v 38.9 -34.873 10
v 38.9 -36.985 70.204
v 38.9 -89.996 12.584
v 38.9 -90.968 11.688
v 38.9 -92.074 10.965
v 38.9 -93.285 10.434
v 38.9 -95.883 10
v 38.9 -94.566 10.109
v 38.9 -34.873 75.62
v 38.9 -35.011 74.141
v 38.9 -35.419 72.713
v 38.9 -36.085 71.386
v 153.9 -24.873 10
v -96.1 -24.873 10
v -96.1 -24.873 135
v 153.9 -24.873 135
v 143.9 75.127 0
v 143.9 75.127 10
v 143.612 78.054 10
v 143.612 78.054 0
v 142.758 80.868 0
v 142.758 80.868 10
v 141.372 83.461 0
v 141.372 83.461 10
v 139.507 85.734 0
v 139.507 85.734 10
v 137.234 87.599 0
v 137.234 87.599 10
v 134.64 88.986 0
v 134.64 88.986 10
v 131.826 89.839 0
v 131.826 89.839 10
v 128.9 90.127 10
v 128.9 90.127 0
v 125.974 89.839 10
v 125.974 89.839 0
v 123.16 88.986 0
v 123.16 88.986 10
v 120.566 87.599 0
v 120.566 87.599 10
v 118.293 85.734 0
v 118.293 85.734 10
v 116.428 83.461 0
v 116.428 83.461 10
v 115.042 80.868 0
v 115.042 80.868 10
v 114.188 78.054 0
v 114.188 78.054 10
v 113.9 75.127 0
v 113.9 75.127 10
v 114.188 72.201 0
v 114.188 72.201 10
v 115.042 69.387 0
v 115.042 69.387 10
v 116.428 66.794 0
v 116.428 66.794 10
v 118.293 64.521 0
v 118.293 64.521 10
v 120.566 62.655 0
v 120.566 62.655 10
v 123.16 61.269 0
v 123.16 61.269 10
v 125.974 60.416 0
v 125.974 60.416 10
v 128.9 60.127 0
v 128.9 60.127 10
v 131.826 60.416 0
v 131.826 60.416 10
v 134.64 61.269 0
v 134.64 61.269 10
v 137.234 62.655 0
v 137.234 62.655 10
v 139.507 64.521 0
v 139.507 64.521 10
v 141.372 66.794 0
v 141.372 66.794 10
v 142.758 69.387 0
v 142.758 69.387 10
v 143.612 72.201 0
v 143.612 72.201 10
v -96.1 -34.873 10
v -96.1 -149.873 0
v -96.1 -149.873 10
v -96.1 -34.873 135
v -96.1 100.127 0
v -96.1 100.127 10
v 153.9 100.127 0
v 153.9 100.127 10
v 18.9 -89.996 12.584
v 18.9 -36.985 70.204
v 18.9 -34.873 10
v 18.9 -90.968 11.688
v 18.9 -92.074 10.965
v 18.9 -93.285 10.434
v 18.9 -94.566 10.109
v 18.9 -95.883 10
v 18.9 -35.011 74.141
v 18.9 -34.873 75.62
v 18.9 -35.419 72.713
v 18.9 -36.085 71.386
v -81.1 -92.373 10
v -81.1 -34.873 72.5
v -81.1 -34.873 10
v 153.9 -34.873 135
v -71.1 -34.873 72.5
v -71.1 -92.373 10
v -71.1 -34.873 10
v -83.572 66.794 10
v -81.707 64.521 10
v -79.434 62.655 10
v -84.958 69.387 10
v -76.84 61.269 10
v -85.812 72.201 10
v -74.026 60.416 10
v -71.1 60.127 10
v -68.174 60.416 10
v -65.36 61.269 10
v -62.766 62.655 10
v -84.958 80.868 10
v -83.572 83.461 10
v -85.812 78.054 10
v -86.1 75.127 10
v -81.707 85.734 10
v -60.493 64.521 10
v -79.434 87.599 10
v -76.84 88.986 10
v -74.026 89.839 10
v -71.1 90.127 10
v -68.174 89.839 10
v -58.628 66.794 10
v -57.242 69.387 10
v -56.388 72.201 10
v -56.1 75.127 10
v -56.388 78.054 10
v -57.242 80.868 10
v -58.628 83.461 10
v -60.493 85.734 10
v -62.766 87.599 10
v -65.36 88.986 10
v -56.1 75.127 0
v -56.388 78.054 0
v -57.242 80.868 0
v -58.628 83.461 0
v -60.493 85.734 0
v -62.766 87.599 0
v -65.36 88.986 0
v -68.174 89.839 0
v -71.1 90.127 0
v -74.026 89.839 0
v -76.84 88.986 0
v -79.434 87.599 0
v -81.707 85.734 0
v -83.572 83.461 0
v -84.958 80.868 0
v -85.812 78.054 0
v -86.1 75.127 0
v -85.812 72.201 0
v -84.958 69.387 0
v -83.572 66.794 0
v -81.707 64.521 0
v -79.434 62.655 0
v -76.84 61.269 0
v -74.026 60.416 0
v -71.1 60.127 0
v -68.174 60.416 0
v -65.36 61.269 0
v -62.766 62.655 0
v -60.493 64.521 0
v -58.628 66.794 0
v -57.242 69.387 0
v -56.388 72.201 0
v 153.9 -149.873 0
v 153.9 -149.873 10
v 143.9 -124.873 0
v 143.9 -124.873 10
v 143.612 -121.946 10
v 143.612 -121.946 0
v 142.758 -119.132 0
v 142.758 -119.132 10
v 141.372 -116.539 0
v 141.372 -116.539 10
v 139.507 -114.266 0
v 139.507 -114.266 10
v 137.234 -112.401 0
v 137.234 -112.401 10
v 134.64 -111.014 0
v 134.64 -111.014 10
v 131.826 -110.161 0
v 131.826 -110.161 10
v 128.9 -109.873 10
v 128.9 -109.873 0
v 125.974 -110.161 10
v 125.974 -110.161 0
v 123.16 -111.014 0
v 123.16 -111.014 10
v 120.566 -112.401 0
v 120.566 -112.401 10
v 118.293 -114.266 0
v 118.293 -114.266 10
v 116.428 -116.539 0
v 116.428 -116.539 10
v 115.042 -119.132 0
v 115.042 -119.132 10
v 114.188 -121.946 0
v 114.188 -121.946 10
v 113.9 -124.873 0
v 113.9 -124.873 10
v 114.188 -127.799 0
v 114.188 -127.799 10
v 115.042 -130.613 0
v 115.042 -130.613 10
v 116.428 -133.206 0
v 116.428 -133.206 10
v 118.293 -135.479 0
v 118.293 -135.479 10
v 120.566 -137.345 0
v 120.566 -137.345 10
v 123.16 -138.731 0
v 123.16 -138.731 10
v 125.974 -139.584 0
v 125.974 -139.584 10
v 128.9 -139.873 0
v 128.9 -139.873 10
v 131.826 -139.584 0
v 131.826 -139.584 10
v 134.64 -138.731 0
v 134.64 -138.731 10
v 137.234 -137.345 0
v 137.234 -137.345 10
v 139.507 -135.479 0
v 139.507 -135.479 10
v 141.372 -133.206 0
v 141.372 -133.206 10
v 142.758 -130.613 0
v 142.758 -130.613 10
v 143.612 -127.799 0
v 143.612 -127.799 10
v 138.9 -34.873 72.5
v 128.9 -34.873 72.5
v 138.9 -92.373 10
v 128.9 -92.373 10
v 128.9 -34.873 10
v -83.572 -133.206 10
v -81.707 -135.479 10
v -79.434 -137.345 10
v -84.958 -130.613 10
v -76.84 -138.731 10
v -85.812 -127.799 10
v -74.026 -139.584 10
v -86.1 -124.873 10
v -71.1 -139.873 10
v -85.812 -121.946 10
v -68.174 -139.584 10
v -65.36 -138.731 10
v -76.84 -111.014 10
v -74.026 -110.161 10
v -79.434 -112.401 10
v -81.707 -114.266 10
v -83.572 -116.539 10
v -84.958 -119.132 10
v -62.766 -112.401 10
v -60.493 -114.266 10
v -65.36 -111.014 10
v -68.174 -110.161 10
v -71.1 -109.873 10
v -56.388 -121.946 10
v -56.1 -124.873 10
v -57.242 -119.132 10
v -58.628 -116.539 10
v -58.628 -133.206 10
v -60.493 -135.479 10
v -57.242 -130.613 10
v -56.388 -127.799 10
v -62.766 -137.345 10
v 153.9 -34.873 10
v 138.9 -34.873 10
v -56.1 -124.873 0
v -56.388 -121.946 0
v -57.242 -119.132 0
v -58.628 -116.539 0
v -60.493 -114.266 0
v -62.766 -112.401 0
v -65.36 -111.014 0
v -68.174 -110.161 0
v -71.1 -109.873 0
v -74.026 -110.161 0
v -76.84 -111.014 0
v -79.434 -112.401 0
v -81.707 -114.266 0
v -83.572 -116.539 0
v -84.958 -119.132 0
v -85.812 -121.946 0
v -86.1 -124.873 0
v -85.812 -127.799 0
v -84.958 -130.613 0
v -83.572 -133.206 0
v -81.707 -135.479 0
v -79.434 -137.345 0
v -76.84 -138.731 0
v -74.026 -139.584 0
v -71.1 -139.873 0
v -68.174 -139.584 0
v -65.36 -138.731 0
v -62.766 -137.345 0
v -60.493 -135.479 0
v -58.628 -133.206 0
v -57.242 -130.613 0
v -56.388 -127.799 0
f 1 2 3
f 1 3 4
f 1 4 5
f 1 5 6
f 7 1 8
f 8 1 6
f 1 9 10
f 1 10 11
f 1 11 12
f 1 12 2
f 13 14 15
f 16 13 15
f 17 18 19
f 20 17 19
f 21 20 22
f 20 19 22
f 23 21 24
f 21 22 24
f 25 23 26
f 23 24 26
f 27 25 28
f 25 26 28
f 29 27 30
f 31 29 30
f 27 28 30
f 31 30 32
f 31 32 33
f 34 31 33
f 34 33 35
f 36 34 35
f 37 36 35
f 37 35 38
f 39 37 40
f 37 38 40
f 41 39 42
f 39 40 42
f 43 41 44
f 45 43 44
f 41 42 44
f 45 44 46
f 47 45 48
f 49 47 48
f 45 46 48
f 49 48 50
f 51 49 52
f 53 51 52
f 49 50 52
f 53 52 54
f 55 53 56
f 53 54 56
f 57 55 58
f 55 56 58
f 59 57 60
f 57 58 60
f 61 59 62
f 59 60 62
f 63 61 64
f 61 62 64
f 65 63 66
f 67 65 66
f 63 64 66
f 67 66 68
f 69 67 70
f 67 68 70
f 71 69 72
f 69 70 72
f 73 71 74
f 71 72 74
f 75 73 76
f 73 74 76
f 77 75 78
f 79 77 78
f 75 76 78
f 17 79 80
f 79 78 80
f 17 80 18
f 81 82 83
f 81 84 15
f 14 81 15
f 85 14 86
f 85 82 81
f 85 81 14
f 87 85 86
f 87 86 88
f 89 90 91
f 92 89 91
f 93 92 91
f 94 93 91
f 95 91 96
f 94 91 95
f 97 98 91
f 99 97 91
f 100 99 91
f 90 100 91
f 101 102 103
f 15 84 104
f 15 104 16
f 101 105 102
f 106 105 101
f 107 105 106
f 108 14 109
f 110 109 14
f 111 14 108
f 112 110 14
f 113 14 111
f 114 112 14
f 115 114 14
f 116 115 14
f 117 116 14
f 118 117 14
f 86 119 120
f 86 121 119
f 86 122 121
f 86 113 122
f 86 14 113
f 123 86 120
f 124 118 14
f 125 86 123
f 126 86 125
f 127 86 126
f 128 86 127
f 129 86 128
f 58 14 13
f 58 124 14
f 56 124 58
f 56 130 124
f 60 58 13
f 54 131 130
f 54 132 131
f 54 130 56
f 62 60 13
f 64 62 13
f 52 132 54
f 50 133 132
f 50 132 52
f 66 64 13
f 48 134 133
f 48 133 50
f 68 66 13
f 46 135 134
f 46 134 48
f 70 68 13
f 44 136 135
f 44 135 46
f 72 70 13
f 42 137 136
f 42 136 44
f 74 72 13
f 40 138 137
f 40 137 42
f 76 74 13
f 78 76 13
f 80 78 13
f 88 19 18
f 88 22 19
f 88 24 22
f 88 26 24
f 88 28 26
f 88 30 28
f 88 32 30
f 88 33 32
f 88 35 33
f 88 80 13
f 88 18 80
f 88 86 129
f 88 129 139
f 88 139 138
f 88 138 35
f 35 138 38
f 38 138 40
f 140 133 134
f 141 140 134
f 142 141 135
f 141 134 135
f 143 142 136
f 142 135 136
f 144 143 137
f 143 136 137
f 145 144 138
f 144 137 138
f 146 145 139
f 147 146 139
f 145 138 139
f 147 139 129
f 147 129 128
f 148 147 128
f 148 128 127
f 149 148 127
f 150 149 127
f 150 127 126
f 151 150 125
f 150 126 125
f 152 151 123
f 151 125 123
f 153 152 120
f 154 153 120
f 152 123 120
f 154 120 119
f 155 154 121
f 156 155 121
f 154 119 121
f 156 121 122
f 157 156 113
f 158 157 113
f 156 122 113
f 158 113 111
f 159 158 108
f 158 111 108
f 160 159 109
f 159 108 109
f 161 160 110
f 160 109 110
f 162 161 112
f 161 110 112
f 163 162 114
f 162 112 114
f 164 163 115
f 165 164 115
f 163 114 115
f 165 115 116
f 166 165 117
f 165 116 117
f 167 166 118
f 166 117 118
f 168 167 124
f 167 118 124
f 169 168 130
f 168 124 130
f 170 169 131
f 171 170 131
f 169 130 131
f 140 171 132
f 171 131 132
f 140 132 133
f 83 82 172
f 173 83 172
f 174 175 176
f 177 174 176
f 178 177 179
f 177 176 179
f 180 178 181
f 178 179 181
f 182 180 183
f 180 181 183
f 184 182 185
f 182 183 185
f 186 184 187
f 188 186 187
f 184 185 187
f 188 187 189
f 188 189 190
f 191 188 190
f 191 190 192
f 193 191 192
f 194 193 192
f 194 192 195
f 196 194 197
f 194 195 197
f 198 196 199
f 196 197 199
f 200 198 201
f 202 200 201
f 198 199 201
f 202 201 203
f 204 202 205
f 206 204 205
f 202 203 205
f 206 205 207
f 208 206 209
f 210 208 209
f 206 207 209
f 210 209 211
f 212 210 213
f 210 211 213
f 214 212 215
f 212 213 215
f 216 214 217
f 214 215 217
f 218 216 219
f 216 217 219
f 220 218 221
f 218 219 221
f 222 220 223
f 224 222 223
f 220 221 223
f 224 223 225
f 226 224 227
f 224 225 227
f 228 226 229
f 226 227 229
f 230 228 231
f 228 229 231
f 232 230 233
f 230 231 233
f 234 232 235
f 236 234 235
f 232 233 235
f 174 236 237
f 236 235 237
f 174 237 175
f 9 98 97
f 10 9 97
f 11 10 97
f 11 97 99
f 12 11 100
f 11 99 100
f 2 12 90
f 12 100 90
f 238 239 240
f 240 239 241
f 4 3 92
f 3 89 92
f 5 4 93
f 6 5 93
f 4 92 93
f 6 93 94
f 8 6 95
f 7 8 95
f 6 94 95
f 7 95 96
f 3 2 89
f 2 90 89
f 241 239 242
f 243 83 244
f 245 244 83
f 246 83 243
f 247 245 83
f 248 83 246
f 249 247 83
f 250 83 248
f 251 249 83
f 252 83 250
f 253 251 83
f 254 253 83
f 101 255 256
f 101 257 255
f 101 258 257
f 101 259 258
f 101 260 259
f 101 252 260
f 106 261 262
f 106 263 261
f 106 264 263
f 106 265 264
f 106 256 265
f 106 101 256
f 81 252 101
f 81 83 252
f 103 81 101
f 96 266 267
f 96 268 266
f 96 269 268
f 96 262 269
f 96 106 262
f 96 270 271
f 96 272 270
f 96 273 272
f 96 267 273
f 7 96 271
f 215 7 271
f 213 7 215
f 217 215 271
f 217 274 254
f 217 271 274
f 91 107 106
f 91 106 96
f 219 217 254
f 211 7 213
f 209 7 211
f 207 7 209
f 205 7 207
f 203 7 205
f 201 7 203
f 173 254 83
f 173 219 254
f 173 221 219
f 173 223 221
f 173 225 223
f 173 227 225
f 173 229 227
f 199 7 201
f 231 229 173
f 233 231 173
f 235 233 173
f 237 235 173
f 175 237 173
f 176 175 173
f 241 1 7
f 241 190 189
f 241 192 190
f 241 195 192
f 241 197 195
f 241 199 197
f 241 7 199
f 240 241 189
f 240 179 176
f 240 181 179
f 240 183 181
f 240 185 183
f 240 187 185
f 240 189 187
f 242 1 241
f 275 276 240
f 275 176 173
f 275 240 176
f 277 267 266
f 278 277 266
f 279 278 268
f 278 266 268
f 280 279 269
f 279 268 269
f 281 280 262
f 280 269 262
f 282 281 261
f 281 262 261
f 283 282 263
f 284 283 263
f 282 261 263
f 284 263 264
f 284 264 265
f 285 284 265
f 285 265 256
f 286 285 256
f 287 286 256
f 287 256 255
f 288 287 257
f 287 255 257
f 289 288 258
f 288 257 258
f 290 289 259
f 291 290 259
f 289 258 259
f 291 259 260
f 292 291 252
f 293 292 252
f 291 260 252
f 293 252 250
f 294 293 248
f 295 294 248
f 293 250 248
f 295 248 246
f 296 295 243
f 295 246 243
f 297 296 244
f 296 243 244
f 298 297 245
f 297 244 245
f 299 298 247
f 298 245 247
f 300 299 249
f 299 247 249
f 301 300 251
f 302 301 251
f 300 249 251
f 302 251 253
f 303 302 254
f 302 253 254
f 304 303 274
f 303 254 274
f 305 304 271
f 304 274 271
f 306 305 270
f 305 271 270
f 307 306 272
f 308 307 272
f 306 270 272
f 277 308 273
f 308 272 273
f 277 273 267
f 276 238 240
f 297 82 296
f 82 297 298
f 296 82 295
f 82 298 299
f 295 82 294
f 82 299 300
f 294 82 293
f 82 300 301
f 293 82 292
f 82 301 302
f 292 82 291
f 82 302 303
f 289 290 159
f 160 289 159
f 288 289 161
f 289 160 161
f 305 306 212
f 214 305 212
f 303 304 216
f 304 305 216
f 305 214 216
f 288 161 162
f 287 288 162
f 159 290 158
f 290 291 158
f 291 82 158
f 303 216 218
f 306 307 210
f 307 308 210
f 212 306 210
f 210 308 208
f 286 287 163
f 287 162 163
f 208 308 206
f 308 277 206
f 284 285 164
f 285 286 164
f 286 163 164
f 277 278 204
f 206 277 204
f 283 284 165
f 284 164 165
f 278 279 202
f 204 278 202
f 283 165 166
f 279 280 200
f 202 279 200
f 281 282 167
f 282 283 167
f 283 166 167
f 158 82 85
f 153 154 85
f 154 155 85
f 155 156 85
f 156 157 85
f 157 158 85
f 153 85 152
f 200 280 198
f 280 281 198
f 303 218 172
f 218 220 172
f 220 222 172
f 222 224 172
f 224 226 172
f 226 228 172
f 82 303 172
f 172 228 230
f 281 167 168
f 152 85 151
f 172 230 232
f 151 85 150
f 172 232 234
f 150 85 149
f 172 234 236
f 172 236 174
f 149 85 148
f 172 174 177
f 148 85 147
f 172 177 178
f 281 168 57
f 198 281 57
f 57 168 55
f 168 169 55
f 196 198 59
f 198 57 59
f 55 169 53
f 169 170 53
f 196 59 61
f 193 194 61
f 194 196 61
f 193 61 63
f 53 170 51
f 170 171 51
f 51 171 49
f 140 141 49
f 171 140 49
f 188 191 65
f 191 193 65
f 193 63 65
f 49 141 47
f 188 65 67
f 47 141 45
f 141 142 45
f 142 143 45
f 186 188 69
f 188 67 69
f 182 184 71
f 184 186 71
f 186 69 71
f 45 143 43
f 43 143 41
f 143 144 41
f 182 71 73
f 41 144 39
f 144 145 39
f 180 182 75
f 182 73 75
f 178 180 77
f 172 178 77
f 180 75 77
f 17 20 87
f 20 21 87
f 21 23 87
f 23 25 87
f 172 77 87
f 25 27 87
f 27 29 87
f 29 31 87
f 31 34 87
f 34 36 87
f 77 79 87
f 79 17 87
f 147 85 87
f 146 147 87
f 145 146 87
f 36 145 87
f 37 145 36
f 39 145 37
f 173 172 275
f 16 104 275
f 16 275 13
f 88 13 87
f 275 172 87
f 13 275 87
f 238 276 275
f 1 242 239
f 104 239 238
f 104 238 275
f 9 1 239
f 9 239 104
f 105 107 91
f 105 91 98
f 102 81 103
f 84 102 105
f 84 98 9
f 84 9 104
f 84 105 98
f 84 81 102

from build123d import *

# Parameters (mm, degrees)
SKETCH1_W                = 250
SKETCH1_H                = 250
BOSS_EXTRUDE1_DEPTH      = 10
SKETCH2_R                = 15
CUT_EXTRUDE1_DEPTH       = 10
SKETCH3_W                = 125
SKETCH3_H                = 10
BOSS_EXTRUDE2_DEPTH      = 250
BOSS_EXTRUDE3_DEPTH      = 10
BOSS_EXTRUDE4_DEPTH      = 10
BOSS_EXTRUDE4_DEPTH_BACK = 10


with BuildPart() as part:
    # Sketch1 → Boss-Extrude1 (new body)
    with BuildSketch(Plane.XY):
        with Locations((28.899957468, -24.872643547)):
            Rectangle(SKETCH1_W, SKETCH1_H)
    extrude(amount=BOSS_EXTRUDE1_DEPTH)

    # Sketch2 → Cut-Extrude1 (cut)
    with BuildSketch(Plane.XY.offset(10)):
        with Locations((-71.100042532, 75.127356453)):
            Circle(SKETCH2_R)
        with Locations((128.899957468, 75.127356453)):
            Circle(SKETCH2_R)
        with Locations((128.899957468, -124.872643547)):
            Circle(SKETCH2_R)
        with Locations((-71.100042532, -124.872643547)):
            Circle(SKETCH2_R)
    extrude(amount=-CUT_EXTRUDE1_DEPTH, mode=Mode.SUBTRACT)

    # Sketch3 → Boss-Extrude2 (add)
    with BuildSketch(Plane.ZY.offset(96.100042532)):
        with Locations((72.5, -29.872643547)):
            Rectangle(SKETCH3_W, SKETCH3_H)
    extrude(amount=-BOSS_EXTRUDE2_DEPTH)

    # Sketch4 → Boss-Extrude3 (add)
    with BuildSketch(Plane.ZY.offset(71.100042532)):
        Polygon((72.5, -34.872643547), (10, -92.372643547), (10, -34.872643547), align=None)
    boss_extrude3 = extrude(amount=BOSS_EXTRUDE3_DEPTH)

    # Mirror1: Boss-Extrude3 across plane
    add(boss_extrude3.mirror(Plane.ZY.offset(-28.899957468)))

    # Sketch5 → Boss-Extrude4 (add, two sides: drawn at the far end of the back side and taken through both)
    with BuildSketch(Plane.ZY.offset(-28.899957468).offset(-BOSS_EXTRUDE4_DEPTH_BACK)):
        with BuildLine():
            ThreePointArc((10, -95.883227708), (10.67430488, -92.668544051), (12.583547753, -89.995779614))
            Line((12.583547753, -89.995779614), (70.203747928, -36.985195453))
            ThreePointArc((70.203747928, -36.985195453), (72.713276092, -35.419470238), (75.620200175, -34.872643547))
            Line((75.620200175, -34.872643547), (10, -34.872643547))
            Line((10, -34.872643547), (10, -95.883227708))
        make_face()
    extrude(amount=BOSS_EXTRUDE4_DEPTH + BOSS_EXTRUDE4_DEPTH_BACK)


solid = part.part
